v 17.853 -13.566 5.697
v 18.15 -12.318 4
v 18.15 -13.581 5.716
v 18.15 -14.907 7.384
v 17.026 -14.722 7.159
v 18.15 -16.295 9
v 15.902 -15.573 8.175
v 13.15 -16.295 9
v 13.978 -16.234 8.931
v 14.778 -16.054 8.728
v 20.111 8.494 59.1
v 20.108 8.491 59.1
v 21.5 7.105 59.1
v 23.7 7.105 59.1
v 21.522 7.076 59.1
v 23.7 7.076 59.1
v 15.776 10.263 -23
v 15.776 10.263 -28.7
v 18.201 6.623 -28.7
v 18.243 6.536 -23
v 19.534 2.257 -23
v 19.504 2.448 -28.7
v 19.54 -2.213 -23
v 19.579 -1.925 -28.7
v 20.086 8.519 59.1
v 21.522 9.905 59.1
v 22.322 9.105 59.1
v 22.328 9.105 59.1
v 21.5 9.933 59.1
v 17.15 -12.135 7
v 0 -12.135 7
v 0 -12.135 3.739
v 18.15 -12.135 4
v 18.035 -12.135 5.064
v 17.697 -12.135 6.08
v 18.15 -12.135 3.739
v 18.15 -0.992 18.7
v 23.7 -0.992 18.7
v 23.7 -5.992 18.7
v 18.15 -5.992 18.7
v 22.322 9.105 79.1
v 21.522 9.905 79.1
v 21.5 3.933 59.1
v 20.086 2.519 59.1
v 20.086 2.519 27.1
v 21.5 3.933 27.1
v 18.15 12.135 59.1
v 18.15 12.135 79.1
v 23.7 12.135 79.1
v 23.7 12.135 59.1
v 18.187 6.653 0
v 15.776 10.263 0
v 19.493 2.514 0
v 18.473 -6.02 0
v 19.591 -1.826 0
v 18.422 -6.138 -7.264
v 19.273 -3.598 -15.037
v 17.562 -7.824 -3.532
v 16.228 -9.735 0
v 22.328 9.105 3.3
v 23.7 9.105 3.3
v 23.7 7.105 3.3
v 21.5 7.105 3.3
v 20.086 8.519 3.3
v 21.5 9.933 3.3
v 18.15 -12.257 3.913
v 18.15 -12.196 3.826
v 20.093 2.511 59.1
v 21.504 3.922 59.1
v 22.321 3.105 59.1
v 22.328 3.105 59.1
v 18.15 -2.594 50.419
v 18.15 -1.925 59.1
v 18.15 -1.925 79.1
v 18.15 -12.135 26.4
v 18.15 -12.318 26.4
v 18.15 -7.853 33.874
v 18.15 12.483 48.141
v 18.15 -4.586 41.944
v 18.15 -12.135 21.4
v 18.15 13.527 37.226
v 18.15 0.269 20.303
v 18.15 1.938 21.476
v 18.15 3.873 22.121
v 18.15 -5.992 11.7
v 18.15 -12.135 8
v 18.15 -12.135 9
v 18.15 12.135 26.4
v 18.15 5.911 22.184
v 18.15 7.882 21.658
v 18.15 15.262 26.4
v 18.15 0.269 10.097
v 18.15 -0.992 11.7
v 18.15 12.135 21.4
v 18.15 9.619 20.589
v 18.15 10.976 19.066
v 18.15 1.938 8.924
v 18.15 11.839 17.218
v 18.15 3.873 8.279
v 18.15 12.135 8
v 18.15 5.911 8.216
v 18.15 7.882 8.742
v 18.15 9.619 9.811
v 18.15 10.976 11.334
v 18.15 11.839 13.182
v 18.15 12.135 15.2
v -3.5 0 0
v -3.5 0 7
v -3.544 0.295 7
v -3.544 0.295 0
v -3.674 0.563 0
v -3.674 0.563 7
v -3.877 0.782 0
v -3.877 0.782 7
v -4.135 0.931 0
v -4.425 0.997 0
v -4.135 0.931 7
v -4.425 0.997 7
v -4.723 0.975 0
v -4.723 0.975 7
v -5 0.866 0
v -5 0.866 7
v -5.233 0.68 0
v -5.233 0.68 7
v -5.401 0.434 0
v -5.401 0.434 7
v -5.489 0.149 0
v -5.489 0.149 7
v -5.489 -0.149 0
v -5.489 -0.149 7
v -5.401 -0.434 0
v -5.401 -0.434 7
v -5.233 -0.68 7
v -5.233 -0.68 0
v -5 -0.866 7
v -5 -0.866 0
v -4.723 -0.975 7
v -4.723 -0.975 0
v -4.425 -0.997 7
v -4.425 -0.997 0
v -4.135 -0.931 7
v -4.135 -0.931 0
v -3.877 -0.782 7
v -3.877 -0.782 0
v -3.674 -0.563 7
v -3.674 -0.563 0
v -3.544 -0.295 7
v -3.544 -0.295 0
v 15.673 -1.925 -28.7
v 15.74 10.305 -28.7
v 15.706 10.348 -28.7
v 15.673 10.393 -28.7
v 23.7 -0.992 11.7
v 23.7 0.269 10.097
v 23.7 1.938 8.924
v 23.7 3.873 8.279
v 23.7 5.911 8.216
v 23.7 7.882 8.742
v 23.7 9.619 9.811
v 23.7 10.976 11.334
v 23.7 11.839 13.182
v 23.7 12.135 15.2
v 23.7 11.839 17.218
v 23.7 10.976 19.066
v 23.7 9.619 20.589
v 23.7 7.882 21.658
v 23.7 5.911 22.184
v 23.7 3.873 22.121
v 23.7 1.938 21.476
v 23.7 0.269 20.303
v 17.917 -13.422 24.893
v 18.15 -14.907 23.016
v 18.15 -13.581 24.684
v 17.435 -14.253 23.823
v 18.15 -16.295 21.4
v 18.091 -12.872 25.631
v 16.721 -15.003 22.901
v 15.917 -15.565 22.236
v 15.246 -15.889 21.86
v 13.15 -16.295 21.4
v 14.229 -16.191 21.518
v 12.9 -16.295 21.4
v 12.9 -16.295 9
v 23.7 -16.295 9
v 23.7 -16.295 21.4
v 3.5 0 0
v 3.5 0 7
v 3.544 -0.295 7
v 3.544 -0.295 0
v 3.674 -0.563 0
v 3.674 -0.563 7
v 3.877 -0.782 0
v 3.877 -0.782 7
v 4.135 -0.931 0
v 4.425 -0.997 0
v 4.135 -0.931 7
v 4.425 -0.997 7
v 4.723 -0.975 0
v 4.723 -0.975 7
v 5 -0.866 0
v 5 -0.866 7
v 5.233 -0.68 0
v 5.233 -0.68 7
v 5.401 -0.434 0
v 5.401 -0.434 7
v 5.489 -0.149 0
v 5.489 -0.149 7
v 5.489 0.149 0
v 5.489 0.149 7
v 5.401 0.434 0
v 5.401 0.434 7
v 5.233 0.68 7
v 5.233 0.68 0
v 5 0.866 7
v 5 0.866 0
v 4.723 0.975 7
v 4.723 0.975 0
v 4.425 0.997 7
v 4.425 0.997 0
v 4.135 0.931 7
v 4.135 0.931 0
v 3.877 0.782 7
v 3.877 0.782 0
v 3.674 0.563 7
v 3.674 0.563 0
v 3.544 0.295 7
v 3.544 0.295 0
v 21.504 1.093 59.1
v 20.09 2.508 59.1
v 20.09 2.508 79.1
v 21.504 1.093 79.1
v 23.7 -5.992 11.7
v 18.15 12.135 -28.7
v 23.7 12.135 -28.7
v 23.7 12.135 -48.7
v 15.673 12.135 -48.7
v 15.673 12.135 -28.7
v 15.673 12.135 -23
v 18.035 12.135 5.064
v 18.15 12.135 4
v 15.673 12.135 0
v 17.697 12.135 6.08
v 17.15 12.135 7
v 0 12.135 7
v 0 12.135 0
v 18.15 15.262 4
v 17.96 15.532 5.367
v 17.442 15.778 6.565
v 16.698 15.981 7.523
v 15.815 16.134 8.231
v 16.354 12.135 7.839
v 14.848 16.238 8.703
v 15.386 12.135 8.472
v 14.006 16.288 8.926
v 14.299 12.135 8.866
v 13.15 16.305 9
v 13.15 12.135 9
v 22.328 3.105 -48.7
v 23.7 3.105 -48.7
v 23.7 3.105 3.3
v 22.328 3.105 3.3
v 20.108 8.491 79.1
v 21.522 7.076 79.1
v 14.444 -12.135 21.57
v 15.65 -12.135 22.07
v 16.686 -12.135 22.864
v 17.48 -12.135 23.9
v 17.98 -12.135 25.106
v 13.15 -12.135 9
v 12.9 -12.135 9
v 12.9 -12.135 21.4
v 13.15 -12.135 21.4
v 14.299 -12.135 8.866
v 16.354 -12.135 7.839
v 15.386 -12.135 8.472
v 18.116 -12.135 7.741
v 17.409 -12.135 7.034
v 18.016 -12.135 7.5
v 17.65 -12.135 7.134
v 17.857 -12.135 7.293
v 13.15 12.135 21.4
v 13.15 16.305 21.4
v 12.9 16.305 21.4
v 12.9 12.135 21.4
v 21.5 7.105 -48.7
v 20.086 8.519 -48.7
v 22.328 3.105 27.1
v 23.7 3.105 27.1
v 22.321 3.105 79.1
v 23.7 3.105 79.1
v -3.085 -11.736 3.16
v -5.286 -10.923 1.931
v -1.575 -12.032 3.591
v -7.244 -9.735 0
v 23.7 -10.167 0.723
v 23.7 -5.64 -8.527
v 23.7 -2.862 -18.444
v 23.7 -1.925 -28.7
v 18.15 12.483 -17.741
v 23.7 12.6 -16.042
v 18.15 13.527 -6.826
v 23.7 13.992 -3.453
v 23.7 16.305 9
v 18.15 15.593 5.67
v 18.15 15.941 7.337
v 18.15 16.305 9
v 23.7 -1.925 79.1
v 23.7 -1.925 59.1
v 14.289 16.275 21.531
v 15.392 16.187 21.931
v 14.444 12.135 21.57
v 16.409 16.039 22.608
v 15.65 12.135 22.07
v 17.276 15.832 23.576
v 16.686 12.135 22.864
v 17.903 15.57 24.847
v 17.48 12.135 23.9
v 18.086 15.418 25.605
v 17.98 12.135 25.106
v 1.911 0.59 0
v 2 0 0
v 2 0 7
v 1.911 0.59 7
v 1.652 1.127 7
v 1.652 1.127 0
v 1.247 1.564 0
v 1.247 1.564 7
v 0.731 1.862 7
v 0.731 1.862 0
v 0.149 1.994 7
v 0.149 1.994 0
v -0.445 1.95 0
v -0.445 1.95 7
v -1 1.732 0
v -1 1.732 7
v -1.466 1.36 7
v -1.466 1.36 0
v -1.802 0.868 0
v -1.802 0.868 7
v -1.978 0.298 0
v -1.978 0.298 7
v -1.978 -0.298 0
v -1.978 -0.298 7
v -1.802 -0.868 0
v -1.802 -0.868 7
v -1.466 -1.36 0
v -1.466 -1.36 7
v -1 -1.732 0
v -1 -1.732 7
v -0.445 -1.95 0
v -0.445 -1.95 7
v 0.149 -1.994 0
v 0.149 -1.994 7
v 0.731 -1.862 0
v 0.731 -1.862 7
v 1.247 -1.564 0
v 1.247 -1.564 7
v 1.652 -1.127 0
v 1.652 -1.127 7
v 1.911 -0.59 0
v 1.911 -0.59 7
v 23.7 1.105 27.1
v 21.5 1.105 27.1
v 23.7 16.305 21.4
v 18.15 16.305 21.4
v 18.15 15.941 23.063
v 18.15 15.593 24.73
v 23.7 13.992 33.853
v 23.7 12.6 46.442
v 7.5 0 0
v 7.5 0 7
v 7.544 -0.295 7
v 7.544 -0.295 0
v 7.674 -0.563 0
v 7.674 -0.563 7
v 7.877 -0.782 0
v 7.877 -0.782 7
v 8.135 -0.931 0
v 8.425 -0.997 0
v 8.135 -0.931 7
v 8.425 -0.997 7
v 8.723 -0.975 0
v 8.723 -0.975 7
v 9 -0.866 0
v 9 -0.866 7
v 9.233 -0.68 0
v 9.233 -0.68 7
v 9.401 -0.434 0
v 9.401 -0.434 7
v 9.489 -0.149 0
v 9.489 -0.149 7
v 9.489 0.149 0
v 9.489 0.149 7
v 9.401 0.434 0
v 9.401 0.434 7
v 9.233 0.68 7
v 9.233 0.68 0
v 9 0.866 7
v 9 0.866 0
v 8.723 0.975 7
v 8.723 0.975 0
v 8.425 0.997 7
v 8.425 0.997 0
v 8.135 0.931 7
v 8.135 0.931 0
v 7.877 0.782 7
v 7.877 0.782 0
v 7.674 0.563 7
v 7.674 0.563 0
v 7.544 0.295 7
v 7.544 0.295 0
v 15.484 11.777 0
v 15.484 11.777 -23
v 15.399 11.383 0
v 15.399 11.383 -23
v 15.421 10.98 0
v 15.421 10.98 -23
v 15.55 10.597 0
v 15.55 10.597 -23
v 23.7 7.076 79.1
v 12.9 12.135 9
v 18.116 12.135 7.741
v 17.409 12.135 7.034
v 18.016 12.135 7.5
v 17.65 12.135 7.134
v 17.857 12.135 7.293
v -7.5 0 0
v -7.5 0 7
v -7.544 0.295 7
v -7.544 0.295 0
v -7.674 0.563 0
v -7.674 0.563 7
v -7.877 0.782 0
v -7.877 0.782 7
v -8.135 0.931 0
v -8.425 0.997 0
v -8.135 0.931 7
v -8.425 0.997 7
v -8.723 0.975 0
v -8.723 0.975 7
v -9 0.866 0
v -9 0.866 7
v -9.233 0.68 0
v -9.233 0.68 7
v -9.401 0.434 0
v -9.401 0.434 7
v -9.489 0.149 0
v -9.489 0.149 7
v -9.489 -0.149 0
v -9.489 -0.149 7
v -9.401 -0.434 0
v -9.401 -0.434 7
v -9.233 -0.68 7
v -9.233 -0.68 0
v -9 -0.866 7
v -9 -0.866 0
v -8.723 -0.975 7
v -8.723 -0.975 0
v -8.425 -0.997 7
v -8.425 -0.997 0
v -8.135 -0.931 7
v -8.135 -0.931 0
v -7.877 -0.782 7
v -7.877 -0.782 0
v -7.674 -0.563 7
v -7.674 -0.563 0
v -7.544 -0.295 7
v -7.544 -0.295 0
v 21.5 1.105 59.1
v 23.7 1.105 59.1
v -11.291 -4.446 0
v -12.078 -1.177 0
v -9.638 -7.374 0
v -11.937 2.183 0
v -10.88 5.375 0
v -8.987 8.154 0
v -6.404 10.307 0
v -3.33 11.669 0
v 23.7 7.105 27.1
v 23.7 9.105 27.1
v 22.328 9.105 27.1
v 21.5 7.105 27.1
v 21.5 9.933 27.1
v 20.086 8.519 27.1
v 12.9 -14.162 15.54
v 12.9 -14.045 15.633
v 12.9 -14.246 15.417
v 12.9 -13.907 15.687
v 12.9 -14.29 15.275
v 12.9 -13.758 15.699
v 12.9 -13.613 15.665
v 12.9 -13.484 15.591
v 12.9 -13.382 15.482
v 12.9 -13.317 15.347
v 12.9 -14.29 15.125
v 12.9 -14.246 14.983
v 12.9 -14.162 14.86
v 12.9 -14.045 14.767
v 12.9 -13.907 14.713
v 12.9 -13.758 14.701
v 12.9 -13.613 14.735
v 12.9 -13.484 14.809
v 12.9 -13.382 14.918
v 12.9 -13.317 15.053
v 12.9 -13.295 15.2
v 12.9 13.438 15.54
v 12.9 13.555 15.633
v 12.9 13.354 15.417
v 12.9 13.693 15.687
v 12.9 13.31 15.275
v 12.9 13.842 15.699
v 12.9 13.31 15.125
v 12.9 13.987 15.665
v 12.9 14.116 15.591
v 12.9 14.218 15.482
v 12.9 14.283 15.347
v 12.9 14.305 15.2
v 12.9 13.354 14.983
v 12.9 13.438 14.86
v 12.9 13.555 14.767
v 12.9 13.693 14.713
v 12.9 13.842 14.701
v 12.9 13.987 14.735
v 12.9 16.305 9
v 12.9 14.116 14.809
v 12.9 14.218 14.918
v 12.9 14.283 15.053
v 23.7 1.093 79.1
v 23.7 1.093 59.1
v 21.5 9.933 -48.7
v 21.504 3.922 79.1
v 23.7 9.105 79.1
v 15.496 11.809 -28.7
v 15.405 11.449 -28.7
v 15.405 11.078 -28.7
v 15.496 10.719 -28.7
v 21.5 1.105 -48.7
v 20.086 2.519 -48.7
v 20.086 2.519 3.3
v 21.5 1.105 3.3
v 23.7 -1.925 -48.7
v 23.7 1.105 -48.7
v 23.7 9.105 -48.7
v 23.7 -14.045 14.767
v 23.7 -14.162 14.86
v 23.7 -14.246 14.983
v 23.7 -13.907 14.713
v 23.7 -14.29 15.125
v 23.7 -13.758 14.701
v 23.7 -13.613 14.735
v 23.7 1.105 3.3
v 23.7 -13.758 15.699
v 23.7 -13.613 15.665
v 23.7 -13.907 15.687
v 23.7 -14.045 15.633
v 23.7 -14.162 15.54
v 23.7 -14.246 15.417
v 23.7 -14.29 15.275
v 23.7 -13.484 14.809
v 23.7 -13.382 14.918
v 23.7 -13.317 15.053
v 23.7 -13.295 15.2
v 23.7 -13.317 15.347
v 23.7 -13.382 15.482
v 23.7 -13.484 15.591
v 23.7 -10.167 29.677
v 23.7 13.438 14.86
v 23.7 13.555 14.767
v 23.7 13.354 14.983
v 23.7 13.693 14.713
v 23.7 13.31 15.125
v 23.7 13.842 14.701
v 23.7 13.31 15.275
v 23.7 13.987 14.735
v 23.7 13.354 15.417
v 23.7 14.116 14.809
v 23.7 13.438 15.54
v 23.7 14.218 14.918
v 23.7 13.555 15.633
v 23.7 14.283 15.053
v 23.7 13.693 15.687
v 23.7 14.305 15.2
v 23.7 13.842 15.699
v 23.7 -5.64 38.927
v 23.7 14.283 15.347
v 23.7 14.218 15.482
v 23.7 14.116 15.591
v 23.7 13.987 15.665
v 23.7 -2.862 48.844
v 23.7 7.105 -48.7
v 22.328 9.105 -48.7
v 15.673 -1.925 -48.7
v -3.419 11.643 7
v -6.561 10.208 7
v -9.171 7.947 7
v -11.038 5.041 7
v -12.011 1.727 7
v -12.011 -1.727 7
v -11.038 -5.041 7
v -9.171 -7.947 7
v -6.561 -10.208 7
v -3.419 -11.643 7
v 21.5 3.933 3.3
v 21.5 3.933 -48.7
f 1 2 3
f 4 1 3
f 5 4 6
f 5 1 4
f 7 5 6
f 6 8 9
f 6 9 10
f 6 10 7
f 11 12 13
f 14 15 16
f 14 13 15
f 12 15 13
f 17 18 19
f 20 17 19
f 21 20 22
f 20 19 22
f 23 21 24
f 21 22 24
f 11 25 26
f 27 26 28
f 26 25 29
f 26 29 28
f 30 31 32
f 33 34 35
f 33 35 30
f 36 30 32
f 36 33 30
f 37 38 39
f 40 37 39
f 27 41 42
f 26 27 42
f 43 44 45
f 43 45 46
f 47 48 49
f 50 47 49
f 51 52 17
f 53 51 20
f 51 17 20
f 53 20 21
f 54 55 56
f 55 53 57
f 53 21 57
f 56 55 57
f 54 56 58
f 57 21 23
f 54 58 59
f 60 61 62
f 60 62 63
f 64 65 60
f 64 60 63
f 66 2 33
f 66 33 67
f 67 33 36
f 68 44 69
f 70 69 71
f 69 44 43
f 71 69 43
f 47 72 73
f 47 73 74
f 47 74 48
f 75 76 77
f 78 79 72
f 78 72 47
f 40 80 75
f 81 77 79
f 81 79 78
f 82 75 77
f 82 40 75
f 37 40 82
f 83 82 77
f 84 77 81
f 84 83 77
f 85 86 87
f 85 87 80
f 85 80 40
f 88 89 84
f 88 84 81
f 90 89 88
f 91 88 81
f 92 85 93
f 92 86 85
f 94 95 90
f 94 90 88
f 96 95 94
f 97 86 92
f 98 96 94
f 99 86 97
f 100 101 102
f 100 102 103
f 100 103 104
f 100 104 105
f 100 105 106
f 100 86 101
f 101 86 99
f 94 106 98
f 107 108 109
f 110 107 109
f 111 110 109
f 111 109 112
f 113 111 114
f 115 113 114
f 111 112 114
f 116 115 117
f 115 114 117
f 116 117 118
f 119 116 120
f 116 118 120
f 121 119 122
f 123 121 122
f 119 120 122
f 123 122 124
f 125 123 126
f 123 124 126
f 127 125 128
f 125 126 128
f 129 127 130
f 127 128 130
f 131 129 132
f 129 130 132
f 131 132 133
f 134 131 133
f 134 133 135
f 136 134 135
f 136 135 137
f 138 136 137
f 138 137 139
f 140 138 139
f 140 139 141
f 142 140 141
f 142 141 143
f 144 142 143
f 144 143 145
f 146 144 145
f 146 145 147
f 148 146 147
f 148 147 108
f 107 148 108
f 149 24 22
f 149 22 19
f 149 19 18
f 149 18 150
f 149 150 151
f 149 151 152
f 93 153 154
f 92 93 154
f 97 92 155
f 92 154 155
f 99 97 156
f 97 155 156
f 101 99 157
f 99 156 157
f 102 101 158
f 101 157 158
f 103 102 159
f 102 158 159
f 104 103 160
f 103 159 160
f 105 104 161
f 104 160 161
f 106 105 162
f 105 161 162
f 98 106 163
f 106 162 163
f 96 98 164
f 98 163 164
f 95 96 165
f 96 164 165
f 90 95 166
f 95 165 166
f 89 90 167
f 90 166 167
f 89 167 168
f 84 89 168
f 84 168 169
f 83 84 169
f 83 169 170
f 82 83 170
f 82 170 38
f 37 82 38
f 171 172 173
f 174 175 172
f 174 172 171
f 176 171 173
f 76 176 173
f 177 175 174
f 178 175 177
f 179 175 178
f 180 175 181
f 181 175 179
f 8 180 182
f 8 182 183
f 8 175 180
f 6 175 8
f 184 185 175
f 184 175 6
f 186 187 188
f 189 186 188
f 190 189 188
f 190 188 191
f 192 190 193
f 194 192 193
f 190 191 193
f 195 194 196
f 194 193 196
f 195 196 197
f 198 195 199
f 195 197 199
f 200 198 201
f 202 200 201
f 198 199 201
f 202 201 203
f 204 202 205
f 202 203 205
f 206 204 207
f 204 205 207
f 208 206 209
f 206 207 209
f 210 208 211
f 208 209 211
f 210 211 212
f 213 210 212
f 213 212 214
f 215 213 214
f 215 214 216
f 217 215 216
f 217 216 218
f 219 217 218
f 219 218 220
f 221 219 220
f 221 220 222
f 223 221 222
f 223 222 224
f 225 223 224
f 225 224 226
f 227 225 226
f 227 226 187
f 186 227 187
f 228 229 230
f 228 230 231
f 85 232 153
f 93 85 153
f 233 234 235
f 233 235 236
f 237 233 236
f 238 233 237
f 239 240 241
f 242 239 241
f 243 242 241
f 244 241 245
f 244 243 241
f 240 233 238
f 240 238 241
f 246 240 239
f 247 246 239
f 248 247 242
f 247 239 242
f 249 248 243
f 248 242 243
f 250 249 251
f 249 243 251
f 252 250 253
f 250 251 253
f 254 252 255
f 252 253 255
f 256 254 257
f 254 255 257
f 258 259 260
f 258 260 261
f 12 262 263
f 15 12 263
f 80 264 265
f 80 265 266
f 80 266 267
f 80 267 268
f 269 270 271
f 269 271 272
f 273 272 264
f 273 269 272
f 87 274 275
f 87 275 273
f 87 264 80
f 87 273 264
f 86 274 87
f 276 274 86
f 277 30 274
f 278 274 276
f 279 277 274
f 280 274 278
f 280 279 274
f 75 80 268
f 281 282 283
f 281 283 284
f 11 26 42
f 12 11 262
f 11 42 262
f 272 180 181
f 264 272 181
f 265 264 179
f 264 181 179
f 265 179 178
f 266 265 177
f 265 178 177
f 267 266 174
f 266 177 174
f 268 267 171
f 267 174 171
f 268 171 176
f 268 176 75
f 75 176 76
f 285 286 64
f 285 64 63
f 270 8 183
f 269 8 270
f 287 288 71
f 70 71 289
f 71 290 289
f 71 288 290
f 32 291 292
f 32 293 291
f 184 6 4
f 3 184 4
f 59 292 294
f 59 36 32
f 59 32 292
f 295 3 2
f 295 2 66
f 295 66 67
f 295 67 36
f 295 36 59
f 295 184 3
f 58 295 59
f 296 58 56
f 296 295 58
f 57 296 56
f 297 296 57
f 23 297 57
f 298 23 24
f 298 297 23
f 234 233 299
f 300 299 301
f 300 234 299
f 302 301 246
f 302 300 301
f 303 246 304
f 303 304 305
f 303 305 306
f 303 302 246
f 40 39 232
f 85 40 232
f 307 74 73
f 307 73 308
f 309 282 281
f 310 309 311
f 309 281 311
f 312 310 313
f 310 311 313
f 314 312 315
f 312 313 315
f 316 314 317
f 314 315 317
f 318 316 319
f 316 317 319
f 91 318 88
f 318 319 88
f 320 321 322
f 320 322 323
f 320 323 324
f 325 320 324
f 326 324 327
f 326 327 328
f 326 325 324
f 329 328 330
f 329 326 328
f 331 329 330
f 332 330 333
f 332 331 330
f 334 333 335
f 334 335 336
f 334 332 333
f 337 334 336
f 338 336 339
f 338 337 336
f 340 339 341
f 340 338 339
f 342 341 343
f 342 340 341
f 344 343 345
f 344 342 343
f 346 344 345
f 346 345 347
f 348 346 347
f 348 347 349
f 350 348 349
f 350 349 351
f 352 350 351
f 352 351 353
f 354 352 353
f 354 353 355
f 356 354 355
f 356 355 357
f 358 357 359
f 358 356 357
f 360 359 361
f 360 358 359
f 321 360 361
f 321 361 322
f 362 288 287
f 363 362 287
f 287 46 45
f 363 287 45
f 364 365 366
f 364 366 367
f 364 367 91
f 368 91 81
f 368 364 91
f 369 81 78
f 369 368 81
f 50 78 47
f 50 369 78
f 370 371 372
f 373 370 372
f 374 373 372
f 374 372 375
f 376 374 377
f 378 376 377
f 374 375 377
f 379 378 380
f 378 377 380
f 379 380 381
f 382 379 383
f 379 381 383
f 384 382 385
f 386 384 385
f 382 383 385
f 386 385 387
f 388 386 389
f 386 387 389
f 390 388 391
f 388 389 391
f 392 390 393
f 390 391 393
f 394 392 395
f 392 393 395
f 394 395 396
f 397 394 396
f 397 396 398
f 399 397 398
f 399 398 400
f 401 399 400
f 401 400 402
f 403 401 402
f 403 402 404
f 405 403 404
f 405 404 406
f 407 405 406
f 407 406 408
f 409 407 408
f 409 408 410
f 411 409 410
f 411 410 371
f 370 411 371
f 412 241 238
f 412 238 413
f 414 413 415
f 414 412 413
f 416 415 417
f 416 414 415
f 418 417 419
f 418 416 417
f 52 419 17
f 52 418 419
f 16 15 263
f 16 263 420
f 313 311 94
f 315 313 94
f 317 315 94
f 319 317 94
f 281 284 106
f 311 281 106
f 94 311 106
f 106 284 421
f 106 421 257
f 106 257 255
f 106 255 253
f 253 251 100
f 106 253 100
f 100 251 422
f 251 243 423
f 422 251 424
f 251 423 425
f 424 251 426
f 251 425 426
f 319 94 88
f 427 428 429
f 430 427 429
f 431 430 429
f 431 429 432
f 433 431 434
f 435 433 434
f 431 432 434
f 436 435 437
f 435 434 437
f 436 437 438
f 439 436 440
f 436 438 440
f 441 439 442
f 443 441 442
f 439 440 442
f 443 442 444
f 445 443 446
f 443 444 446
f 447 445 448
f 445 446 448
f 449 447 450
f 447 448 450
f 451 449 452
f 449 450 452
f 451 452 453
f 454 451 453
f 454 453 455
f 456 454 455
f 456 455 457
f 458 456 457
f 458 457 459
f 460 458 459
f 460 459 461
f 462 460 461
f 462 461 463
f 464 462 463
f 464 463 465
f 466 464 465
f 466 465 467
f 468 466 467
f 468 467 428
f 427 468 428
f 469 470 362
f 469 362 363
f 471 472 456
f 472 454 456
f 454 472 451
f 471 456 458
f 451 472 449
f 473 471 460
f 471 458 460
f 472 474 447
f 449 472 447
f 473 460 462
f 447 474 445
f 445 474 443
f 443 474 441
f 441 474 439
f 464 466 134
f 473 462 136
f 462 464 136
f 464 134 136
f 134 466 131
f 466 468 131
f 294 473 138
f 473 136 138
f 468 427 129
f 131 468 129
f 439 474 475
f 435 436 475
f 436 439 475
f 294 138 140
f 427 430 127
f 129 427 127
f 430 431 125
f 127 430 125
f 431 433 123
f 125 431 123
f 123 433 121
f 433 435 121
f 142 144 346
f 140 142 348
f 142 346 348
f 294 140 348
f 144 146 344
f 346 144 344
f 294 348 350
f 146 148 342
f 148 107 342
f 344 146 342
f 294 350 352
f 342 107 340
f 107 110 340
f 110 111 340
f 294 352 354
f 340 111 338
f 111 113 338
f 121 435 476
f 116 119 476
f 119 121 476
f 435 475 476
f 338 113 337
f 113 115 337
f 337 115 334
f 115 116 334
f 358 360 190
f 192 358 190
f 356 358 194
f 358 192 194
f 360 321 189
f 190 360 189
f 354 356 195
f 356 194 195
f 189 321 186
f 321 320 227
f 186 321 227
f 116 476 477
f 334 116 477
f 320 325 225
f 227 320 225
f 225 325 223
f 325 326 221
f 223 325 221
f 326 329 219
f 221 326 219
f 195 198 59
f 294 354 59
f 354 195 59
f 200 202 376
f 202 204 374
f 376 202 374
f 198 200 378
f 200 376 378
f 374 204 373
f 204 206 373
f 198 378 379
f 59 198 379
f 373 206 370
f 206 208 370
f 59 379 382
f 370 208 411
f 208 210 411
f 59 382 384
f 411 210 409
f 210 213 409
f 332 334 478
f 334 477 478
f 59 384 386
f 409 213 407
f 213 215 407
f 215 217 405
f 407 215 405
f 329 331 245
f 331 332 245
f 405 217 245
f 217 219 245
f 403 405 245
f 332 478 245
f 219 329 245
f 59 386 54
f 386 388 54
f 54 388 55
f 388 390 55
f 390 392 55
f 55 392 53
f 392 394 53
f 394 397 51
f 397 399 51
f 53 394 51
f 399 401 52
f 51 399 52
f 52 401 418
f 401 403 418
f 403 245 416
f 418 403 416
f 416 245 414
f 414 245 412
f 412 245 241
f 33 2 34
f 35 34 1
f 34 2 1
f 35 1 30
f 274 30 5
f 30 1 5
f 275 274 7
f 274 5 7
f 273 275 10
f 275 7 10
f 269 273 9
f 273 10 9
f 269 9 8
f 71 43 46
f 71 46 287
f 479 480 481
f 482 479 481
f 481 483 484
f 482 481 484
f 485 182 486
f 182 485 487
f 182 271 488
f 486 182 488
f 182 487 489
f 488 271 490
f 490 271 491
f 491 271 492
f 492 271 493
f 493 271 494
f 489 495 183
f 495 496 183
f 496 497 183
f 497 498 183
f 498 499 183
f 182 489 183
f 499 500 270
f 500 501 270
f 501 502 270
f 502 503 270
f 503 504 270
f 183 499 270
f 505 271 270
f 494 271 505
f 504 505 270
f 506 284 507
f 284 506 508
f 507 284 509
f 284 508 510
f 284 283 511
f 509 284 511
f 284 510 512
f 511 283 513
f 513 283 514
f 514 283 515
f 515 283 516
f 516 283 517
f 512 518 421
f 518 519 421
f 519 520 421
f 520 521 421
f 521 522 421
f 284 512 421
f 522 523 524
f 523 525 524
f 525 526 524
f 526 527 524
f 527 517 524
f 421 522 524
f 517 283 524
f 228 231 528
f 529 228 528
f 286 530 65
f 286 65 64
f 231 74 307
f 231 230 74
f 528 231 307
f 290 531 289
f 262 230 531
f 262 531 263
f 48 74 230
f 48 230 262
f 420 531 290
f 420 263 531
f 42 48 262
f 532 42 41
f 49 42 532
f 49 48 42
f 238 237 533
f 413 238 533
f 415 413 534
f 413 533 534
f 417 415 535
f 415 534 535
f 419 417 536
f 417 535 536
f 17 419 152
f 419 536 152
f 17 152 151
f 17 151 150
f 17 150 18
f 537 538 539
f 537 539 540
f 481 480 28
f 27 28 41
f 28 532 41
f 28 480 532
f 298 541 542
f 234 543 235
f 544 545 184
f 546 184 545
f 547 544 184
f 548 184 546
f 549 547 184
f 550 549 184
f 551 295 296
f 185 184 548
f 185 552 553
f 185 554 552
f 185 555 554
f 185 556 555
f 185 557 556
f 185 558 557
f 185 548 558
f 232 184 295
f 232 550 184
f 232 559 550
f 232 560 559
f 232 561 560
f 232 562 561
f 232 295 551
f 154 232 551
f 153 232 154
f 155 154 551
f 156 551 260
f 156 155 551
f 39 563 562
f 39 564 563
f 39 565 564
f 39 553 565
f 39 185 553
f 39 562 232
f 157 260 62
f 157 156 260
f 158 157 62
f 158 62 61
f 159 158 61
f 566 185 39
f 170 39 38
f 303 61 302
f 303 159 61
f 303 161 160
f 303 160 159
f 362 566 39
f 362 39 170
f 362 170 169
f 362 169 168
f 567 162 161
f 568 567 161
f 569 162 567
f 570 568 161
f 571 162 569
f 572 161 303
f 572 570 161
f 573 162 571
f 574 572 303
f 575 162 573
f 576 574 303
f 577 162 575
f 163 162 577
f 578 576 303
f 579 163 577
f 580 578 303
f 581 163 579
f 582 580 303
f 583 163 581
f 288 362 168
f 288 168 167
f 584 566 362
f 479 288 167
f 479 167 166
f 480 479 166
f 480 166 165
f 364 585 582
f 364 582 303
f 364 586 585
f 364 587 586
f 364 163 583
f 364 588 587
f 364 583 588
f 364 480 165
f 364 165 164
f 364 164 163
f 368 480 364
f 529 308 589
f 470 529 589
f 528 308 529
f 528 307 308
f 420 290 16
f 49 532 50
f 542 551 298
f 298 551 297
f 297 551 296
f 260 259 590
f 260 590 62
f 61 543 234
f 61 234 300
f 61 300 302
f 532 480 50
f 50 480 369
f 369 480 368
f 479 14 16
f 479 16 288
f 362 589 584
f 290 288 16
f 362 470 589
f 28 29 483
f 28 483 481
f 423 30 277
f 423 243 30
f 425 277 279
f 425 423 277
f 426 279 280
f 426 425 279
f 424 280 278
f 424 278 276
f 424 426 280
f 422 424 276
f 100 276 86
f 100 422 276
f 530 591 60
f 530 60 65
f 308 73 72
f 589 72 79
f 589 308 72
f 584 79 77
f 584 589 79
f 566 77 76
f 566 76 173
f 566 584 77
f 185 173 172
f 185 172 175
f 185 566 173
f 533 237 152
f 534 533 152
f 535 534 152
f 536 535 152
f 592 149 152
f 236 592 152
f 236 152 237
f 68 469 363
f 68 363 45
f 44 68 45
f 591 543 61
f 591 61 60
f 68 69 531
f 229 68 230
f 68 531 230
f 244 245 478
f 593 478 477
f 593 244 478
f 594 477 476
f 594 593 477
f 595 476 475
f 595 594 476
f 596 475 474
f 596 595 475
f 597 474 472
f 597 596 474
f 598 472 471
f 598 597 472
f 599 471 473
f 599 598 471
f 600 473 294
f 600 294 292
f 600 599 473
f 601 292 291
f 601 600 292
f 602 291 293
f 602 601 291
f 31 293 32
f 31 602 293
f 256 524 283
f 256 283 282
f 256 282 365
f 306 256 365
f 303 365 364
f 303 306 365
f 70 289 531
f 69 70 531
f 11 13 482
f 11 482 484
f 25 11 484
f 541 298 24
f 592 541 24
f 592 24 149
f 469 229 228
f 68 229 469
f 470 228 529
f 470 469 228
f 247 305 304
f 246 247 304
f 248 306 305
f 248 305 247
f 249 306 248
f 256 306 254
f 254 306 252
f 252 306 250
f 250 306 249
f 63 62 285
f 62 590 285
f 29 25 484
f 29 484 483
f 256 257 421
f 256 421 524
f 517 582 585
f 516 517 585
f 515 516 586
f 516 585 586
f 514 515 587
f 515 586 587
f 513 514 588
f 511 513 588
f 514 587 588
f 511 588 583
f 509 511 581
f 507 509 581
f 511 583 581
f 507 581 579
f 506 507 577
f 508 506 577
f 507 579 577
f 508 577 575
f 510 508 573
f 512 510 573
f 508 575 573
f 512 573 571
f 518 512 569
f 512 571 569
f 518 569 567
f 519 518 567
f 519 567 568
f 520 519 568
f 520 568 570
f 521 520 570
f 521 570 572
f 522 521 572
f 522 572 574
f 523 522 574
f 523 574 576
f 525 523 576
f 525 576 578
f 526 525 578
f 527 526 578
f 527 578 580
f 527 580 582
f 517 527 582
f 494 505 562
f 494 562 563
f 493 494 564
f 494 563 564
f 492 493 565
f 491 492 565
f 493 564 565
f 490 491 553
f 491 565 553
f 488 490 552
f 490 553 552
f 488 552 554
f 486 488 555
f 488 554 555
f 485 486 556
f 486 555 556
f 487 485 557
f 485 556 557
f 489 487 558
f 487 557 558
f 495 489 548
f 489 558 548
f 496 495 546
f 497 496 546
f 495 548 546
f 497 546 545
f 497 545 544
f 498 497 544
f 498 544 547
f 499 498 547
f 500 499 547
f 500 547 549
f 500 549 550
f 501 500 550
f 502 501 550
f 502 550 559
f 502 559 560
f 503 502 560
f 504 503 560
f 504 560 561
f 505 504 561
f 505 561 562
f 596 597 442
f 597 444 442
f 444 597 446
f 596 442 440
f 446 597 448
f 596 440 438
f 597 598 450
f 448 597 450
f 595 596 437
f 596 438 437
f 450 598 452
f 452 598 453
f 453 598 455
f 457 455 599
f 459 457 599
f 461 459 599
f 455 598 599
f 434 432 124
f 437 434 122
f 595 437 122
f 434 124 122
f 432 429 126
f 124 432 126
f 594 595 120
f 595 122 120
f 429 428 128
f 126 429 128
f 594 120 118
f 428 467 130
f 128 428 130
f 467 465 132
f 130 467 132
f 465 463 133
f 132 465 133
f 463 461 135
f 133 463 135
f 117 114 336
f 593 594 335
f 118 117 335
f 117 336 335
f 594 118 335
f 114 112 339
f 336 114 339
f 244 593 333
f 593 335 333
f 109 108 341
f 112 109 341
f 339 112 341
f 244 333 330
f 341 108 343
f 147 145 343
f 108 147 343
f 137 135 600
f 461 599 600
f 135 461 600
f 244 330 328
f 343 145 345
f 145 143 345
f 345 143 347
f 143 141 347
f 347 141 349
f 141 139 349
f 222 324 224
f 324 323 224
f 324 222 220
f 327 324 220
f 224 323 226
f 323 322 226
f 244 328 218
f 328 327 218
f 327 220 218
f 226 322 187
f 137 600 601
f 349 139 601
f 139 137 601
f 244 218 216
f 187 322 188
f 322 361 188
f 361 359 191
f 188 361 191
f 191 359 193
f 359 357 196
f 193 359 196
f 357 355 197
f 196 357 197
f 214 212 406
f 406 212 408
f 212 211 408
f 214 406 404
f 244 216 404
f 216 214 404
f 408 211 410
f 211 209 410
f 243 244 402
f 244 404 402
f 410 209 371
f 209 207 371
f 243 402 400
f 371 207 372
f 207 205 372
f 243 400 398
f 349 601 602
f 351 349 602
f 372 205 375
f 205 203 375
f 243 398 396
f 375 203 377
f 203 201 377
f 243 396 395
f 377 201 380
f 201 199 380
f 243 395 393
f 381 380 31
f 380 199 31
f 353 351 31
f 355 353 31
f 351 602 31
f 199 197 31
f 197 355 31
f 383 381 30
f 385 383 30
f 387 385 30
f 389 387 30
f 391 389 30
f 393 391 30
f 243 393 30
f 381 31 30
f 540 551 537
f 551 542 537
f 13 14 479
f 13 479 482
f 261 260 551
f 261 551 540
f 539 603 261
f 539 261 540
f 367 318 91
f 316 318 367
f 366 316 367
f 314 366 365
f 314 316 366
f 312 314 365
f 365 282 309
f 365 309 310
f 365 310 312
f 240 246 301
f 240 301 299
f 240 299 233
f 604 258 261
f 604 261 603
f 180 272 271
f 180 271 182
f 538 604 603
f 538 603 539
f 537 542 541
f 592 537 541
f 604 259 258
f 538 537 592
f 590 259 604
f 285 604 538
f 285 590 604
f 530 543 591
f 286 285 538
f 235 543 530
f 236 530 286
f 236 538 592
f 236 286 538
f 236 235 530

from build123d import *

# Parameters (mm, degrees)
SKETCH1_R               = 2
BOSS_EXTRUDE3_DEPTH     = 7
SKETCH3_R               = 1.0000000000000002
SKETCH3_R_2             = 0.9999999999999998
SKETCH3_R_3             = 0.9999999999999996
SKETCH3_R_4             = 0.9999999999999993
CUT_EXTRUDE2_DEPTH      = 26.09227496303999
BOSS_EXTRUDE4_START     = -7
BOSS_EXTRUDE4_DEPTH     = 7
BOSS_EXTRUDE5_START     = -30
BOSS_EXTRUDE5_DEPTH     = 30
FILLET2_R               = 1.5
CUT_EXTRUDE5_DEPTH      = 42.36510924463761
BOSS_EXTRUDE6_DEPTH     = 10.5
MOVE_START              = -28.7
MOVE_FACE1_DEPTH        = 5.7
DELETEFACE1_START       = 23.7
DELETEFACE1_OUTLINE_W   = 10.499999999999998
DELETEFACE1_OUTLINE_H   = 35.699999999999996
DELETEFACE1_DEPTH       = 15.7
SKETCH11_OUTSIDE_W      = 51.876
SKETCH11_OUTSIDE_H      = 42.462
CUT_EXTRUDE6_DEPTH      = 46.16926949380307
SERVO_START             = -12.760864102
SERVO_MICRO_OUTLINE_W   = 22.6
SERVO_MICRO_OUTLINE_H   = 12.399999999999999
SERVO_MICRO_DEPTH       = 22.3
SERVO_START_2           = 9.539135898
SERVO_MICRO_2_DEPTH     = 4.3
SERVO_START_3           = 2.889135898
SERVO_MICRO_3_DEPTH     = 2.4
SERVO_START_4           = 13.839135898
SERVO_MICRO_4_OUTLINE_R = 2.5
SERVO_MICRO_4_DEPTH     = 3.3
SERVO_START_5           = -25.667487826
SERVO_MICRO_5_OUTLINE_R = 0.6
SERVO_MICRO_5_DEPTH     = 2.3
SERVO_MICRO_6_OUTLINE_R = 0.6
SERVO_MICRO_6_DEPTH     = 2.3
SERVO_MICRO_7_OUTLINE_R = 0.6
SERVO_MICRO_7_DEPTH     = 2.3
BODY_MOVE_COPY1_ANGLE   = 90
SKETCH13_R              = 0.5000000000000009
SKETCH13_W              = 12.399999999999997
SKETCH13_H              = 4.17
SKETCH13_H_2            = 4.160545319150279
BOSS_EXTRUDE7_DEPTH     = 5.55
SKETCH13_3_W            = 12.399999999999997
SKETCH13_3_H            = 4.17
SKETCH13_3_R            = 0.5000000000000009
SKETCH13_3_H_2          = 4.160545319150279
BOSS_EXTRUDE8_DEPTH     = 10.8
CUT_EXTRUDE7_DEPTH      = 32
BOSS_EXTRUDE9_DEPTH     = 5.55
CUT_EXTRUDE8_DEPTH      = 72.0125468998838
BOSS_EXTRUDE10_DEPTH    = 5.55
FILLET8_START           = 12.13472734
FILLET8_DEPTH           = 2.98662
FILLET8_START_2         = -16.295273118
FILLET8_2_DEPTH         = 4.160545778
FILLET8_START_3         = 15.12134734
FILLET8_3_DEPTH         = 1.18338
FILLET8_START_4         = -7.24411042
FILLET8_4_DEPTH         = 25.39411042
FILLET9_R               = 1
SKETCH19_W              = 5.550000000000004
SKETCH19_H              = 14.059999999999988
BOSS_EXTRUDE11_DEPTH    = 20
CUT_EXTRUDE9_DEPTH      = 20
SKETCH21_W              = 8.027459463040207
SKETCH21_H              = 14.059999999999993
BOSS_EXTRUDE12_DEPTH    = 20
CUT_EXTRUDE10_DEPTH     = 20


with BuildPart() as part:
    # Sketch1 → Boss-Extrude3 (new body)
    with BuildSketch(Plane.XY):
        with BuildLine():
            Line((5.606455718863049, 13.824363162033857), (-15.462379801128069, 15.791841653866829))
            Line((-15.462379801128069, 15.791841653866829), (-15.46237980112806, -15.791841653866806))
            Line((-15.46237980112806, -15.791841653866806), (5.606455718863063, -13.824363162033817))
            ThreePointArc((5.606455718863063, -13.824363162033817), (18.200000000000003, 2.613e-14), (5.606455718863049, 13.824363162033857))
        make_face()
        Circle(SKETCH1_R, mode=Mode.SUBTRACT)
    extrude(amount=BOSS_EXTRUDE3_DEPTH)

    # Sketch3 → Cut-Extrude2 (cut, through all)
    with BuildSketch(Plane.XY.offset(7)):
        with Locations((-4.5, 0)):
            Circle(SKETCH3_R)
        with Locations((-8.499999999999998, 0)):
            Circle(SKETCH3_R_2)
        with Locations(Location((4.5, -1.73e-15, 0), (0, 0, 180))):
            Circle(SKETCH3_R_3)
        with Locations(Location((8.499999999999998, -1.73e-15, 0), (0, 0, 180))):
            Circle(SKETCH3_R_4)
    extrude(amount=-CUT_EXTRUDE2_DEPTH, mode=Mode.SUBTRACT)

    # Sketch6 → Boss-Extrude4 (add)
    with BuildSketch(Plane.XY.offset(7).offset(BOSS_EXTRUDE4_START)):
        with BuildLine():
            Line((12.20372638619735, 13.208287910486863), (5.606455718863047, 13.824363162033858))
            ThreePointArc((5.606455718863047, 13.82436316203386), (18.2, 2.598e-14), (5.606455718863056, -13.824363162033816))
            Line((5.606455718863056, -13.824363162033816), (12.203726386197348, -13.208287910486817))
            ThreePointArc((12.203726386197348, -13.208287910486817), (19.699999999999996, 2.132e-14), (12.20372638619735, 13.20828791048686))
        make_face()
    extrude(amount=BOSS_EXTRUDE4_DEPTH)

    # Sketch6<3> → Boss-Extrude5 (add)
    with BuildSketch(Plane.XY.offset(7).offset(BOSS_EXTRUDE5_START)):
        with BuildLine():
            Line((23.700000000000006, 12.13472734042489), (12.20372638619735, 13.208287910486863))
            ThreePointArc((12.20372638619735, 13.20828791048686), (19.699999999999996, 2.132e-14), (12.203726386197348, -13.208287910486817))
            Line((12.203726386197348, -13.208287910486817), (23.700000000000003, -12.134727340424835))
            Line((23.700000000000003, -12.134727340424835), (23.700000000000006, 12.134727340424892))
        make_face()
    extrude(amount=BOSS_EXTRUDE5_DEPTH)

    # Fillet2
    fillet2_edges = [part.edges().sort_by_distance(p)[0] for p in [
        (12.20372638619735, -13.208287910486817, -11.5),
        (12.20372638619735, 13.208287910486861, -11.5),
    ]]
    fillet(fillet2_edges, radius=FILLET2_R)

    # Sketch8 → Cut-Extrude5 (cut, through all)
    with BuildSketch(Plane.XY.offset(7)):
        with BuildLine():
            Line((-15.462379801128069, 15.791841653866829), (-15.46237980112806, -15.791841653866808))
            Line((-15.46237980112806, -15.791841653866806), (1.328273056892355, -14.223874201150027))
            ThreePointArc((1.3282730568923518, -14.22387420115002), (-14.285758873920813, 0), (1.3282730568923529, 14.22387420115002))
            Line((1.3282730568923604, 14.223874201150062), (-15.462379801128069, 15.791841653866829))
        make_face()
    extrude(amount=-CUT_EXTRUDE5_DEPTH, mode=Mode.SUBTRACT)

    # Sketch10 → Boss-Extrude6 (add)
    with BuildSketch(Plane.ZX.offset(1.6347273404248903)):
        Polygon((7, 23.700000000000003), (7, 39.40000000018666), (-28.700000000000003, 39.40000000018665), (-28.700000000000014, 23.700000000000003), align=None)
    extrude(amount=BOSS_EXTRUDE6_DEPTH)

    # Move Face1: read off the stored shape, not the designer's step
    # Move Face1 outline → Move Face1 (add)
    with BuildSketch(Plane.XY.offset(MOVE_START)):
        with BuildLine():
            Line((17.033263706, -12.757289525), (23.7, -12.13472734))
            Line((23.7, -12.13472734), (23.7, 12.13472734))
            Line((23.7, 12.13472734), (17.033263706, 12.757289525))
            ThreePointArc((17.033263706, 12.757289525), (15.554272674, 11.938827155), (15.776353621, 10.263125757))
            ThreePointArc((15.776353621, 10.263125757), (19.7, 0), (15.776353621, -10.263125757))
            ThreePointArc((15.776353621, -10.263125757), (15.554272674, -11.938827155), (17.033263706, -12.757289525))
        make_face()
    extrude(amount=MOVE_FACE1_DEPTH)

    # DeleteFace1: read off the stored shape, not the designer's step
    # DeleteFace1 outline → DeleteFace1 (cut)
    with BuildSketch(Plane.YZ.offset(DELETEFACE1_START)):
        with Locations((6.884727339999999, -10.849999999999998)):
            Rectangle(DELETEFACE1_OUTLINE_W, DELETEFACE1_OUTLINE_H)
    extrude(amount=DELETEFACE1_DEPTH, mode=Mode.SUBTRACT)

    # Sketch11 outside → Cut-Extrude6 (cut, through all)
    with BuildSketch(Plane.XY.offset(7)):
        with Locations((4.706999999999997, 0)):
            Rectangle(SKETCH11_OUTSIDE_W, SKETCH11_OUTSIDE_H)
        with BuildLine():
            Line((23.700000000000003, 12.134727340424888), (-1.43e-15, 12.134727340424885))
            ThreePointArc((-1.43e-15, 12.134727340424885), (-12.134727340424885, 1.49e-15), (0, -12.134727340424885))
            Line((0, -12.134727340424885), (23.700000000000006, -12.134727340424835))
            Line((23.700000000000006, -12.134727340424835), (23.700000000000003, 12.134727340424888))
        make_face(mode=Mode.SUBTRACT)
    extrude(amount=-CUT_EXTRUDE6_DEPTH, mode=Mode.SUBTRACT)

    # Sketch13 → Boss-Extrude7 (add)
    # profile 1 of 3: a face of its own
    with BuildSketch(Plane(origin=(23.700000000000003, -3.39e-15, 0), x_dir=(0, 0, -1), z_dir=(1, -1.4e-16, 0))):
        Polygon((-9.000000000000002, -16.295272659575108), (-9.000000000000002, -12.134727340424831), (-7, -12.134727340424831), (-6.999999999999999, 12.134727340424892), (-9.000000000000002, 12.13472734042489), (-9.000000000000002, 16.30472734042489), (-21.4, 16.30472734042489), (-21.4, 12.13472734042489), (-59.100000000000016, 12.134727340424885), (-59.100000000000016, -12.134727340424831), (-21.4, -12.134727340424831), (-21.4, -16.295272659575108), align=None)
        with Locations(Location((-15.200000000000001, 13.80472734042489, 0), (0, 0, 90))):
            Circle(SKETCH13_R, mode=Mode.SUBTRACT)
        with Locations(Location((-15.200000000000001, -13.79527265957511, 0), (0, 0, 90))):
            Circle(SKETCH13_R, mode=Mode.SUBTRACT)
        with BuildLine():
            ThreePointArc((-11.700000000000001, -0.9920668991734916), (-15.199999999999998, 12.13472734042489), (-18.700000000000003, -0.9920668991734924))
            Line((-18.700000000000003, -0.9920668991734924), (-18.700000000000003, -5.9920668991734924))
            Line((-18.700000000000003, -5.9920668991734924), (-11.700000000000003, -5.992066899173492))
            Line((-11.700000000000003, -5.992066899173492), (-11.700000000000001, -0.9920668991734916))
        make_face(mode=Mode.SUBTRACT)
    # profile 2 of 3: a face of its own
    with BuildSketch(Plane(origin=(23.700000000000003, -3.39e-15, 0), x_dir=(0, 0, -1), z_dir=(1, -1.4e-16, 0))):
        with Locations((-15.2, 14.219727340424889)):
            Rectangle(SKETCH13_W, SKETCH13_H)
        with Locations(Location((-15.200000000000001, 13.80472734042489, 0), (0, 0, 90))):
            Circle(SKETCH13_R, mode=Mode.SUBTRACT)
    # profile 3 of 3: a face of its own
    with BuildSketch(Plane(origin=(23.700000000000003, -3.39e-15, 0), x_dir=(0, 0, -1), z_dir=(1, -1.4e-16, 0))):
        with Locations((-15.2, -14.214999999999968)):
            Rectangle(SKETCH13_W, SKETCH13_H_2)
        with Locations(Location((-15.200000000000001, -13.79527265957511, 0), (0, 0, 90))):
            Circle(SKETCH13_R, mode=Mode.SUBTRACT)
    extrude(amount=-BOSS_EXTRUDE7_DEPTH)

    # Sketch13<3> → Boss-Extrude8 (add)
    # profile 1 of 2: a face of its own
    with BuildSketch(Plane(origin=(23.700000000000003, -3.39e-15, 0), x_dir=(0, 0, -1), z_dir=(1, -1.4e-16, 0))):
        with Locations((-15.2, 14.219727340424889)):
            Rectangle(SKETCH13_3_W, SKETCH13_3_H)
        with Locations(Location((-15.200000000000001, 13.80472734042489, 0), (0, 0, 90))):
            Circle(SKETCH13_3_R, mode=Mode.SUBTRACT)
    # profile 2 of 2: a face of its own
    with BuildSketch(Plane(origin=(23.700000000000003, -3.39e-15, 0), x_dir=(0, 0, -1), z_dir=(1, -1.4e-16, 0))):
        with Locations((-15.2, -14.214999999999968)):
            Rectangle(SKETCH13_3_W, SKETCH13_3_H_2)
        with Locations(Location((-15.200000000000001, -13.79527265957511, 0), (0, 0, 90))):
            Circle(SKETCH13_3_R, mode=Mode.SUBTRACT)
    extrude(amount=-BOSS_EXTRUDE8_DEPTH)

    # Sketch15 → Cut-Extrude7 (cut)
    with BuildSketch(Plane(origin=(1.903e-14, 0, -28.70000000000003), x_dir=(-1, 0, -6.6e-16), z_dir=(6.6e-16, 0, -1))):
        Polygon((-22.328427124746177, 3.104727340424887), (-23.699999999999985, 3.104727340424887), (-23.699999999999985, 1.1047273404248876), (-21.499999999999986, 1.1047273404248876), (-20.08578643762689, 2.5189409027979854), (-21.49999999999999, 3.9331544651710773), align=None)
        Polygon((-22.328427124746177, 9.104727340424887), (-23.699999999999985, 9.104727340424887), (-23.699999999999985, 7.104727340424887), (-21.499999999999986, 7.104727340424887), (-20.08578643762689, 8.518940902797986), (-21.49999999999999, 9.933154465171077), align=None)
    cut_extrude7 = extrude(amount=-CUT_EXTRUDE7_DEPTH, mode=Mode.SUBTRACT)

    # Mirror1: Cut-Extrude7 across plane
    add(cut_extrude7.mirror(Plane(origin=(0, 0, 15.200000000000001), x_dir=(1, 0, 0), z_dir=(0, 0, -1))), mode=Mode.SUBTRACT)

    # Sketch16 → Boss-Extrude9 (add)
    with BuildSketch(Plane(origin=(23.700000000000003, -3.39e-15, 0), x_dir=(0, 0, -1), z_dir=(1, -1.4e-16, 0))):
        with BuildLine():
            Line((-21.4, 12.13472734042489), (-21.4, 16.30472734042489))
            ThreePointArc((-21.4, 16.30472734042489), (-40.135039546574305, 13.18039662240372), (-59.100000000000016, 12.134727340424885))
            Line((-59.100000000000016, 12.134727340424885), (-21.4, 12.13472734042489))
        make_face()
        with BuildLine():
            Line((-9.000000000000002, 16.30472734042489), (-9.000000000000002, 12.13472734042489))
            Line((-9.000000000000002, 12.13472734042489), (28.700000000000014, 12.134727340424892))
            ThreePointArc((28.700000000000014, 12.134727340424892), (9.735039546574328, 13.180396622403777), (-9.000000000000002, 16.30472734042489))
        make_face()
    extrude(amount=-BOSS_EXTRUDE9_DEPTH)

    # Sketch18 → Cut-Extrude8 (cut, through all)
    with BuildSketch(Plane(origin=(23.700000000000003, -3.39e-15, 0), x_dir=(0, 0, -1), z_dir=(1, -1.4e-16, 0))):
        with BuildLine():
            Line((-59.100000000000016, -12.134727340424831), (-26.661429094135563, -12.134727340424831))
            ThreePointArc((-26.661429094135563, -12.134727340424838), (-42.096369157624615, -4.537893974213425), (-59.100000000000016, -1.9252726595751))
            Line((-59.100000000000016, -1.9252726595751037), (-59.100000000000016, -12.134727340424831))
        make_face()
        with BuildLine():
            Line((-3.7385709058644423, -12.134727340424831), (28.700000000000003, -12.134727340424831))
            Line((28.700000000000003, -12.134727340424831), (28.700000000000003, -1.9252726595751037))
            ThreePointArc((28.700000000000003, -1.9252726595751), (11.69636915762461, -4.537893974213425), (-3.738570905864435, -12.134727340424838))
        make_face()
    extrude(amount=-CUT_EXTRUDE8_DEPTH, mode=Mode.SUBTRACT)

    # Sketch18<3> → Boss-Extrude10 (add)
    with BuildSketch(Plane(origin=(23.700000000000003, -3.39e-15, 0), x_dir=(0, 0, -1), z_dir=(1, -1.4e-16, 0))):
        with BuildLine():
            ThreePointArc((-26.661429094135563, -12.134727340424838), (-23.96906894889605, -14.137042924937433), (-21.4, -16.295272659575097))
            Line((-21.4, -16.295272659575108), (-21.4, -12.134727340424831))
            Line((-21.4, -12.134727340424831), (-26.66142909413556, -12.134727340424831))
        make_face()
        with BuildLine():
            ThreePointArc((-9, -16.295272659575097), (-6.430931051103947, -14.137042924937433), (-3.738570905864435, -12.134727340424838))
            Line((-3.7385709058644423, -12.134727340424831), (-9.000000000000005, -12.134727340424831))
            Line((-9.000000000000005, -12.134727340424831), (-9.000000000000005, -16.295272659575108))
        make_face()
    extrude(amount=-BOSS_EXTRUDE10_DEPTH)

    # Fillet8: read off the stored shape, not the designer's step
    # Fillet8 outline → Fillet8 (add)
    with BuildSketch(Plane(origin=(0, 0, 0), x_dir=(1, 0, 0), z_dir=(0, 1, 0)).offset(FILLET8_START)):
        with BuildLine():
            Line((13.15, -9), (18.15, -9))
            Line((18.15, -9), (18.15, -4))
            ThreePointArc((18.15, -4), (16.685533906, -7.535533906), (13.15, -9))
        make_face()
        with BuildLine():
            ThreePointArc((13.15, -21.4), (16.685533906, -22.864466094), (18.15, -26.4))
            Line((18.15, -26.4), (18.15, -21.4))
            Line((18.15, -21.4), (13.15, -21.4))
        make_face()
    extrude(amount=FILLET8_DEPTH)

    # Fillet8 2 outline → Fillet8 2 (add)
    with BuildSketch(Plane(origin=(0, 0, 0), x_dir=(1, 0, 0), z_dir=(0, 1, 0)).offset(FILLET8_START_2)):
        with BuildLine():
            Line((13.15, -9), (18.15, -9))
            Line((18.15, -9), (18.15, -4))
            ThreePointArc((18.15, -4), (16.685533906, -7.535533906), (13.15, -9))
        make_face()
        with BuildLine():
            ThreePointArc((13.15, -21.4), (16.685533906, -22.864466094), (18.15, -26.4))
            Line((18.15, -26.4), (18.15, -21.4))
            Line((18.15, -21.4), (13.15, -21.4))
        make_face()
    extrude(amount=FILLET8_2_DEPTH)

    # Fillet8 3 outline → Fillet8 3 (add)
    with BuildSketch(Plane(origin=(0, 0, 0), x_dir=(1, 0, 0), z_dir=(0, 1, 0)).offset(FILLET8_START_3)):
        with BuildLine():
            Line((13.15, -9), (18.15, -9))
            Line((18.15, -9), (18.15, -4))
            ThreePointArc((18.15, -4), (16.685533906, -7.535533906), (13.15, -9))
        make_face()
        with BuildLine():
            ThreePointArc((13.15, -21.4), (16.685533906, -22.864466094), (18.15, -26.4))
            Line((18.15, -26.4), (18.15, -21.4))
            Line((18.15, -21.4), (13.15, -21.4))
        make_face()
    extrude(amount=FILLET8_3_DEPTH)

    # Fillet8 4 outline → Fillet8 4 (cut)
    with BuildSketch(Plane.YZ.offset(FILLET8_START_4)):
        with BuildLine():
            ThreePointArc((-12.31848008, 4), (-14.236321945, 6.556116062), (-16.29527266, 9))
            Line((-16.29527266, 9), (-16.295273118, 4))
            Line((-16.295273118, 4), (-12.31848008, 4))
        make_face()
        with BuildLine():
            Line((16.30472734, 4), (16.30472734, 9))
            ThreePointArc((16.30472734, 9), (15.765062943, 6.503857829), (15.262410605, 4))
            Line((15.262410605, 4), (16.30472734, 4))
        make_face()
        with BuildLine():
            Line((-12.31848008, 26.4), (-16.295273118, 26.4))
            Line((-16.295273118, 26.4), (-16.29527266, 21.4))
            ThreePointArc((-16.29527266, 21.4), (-14.236321945, 23.843883938), (-12.31848008, 26.4))
        make_face()
        with BuildLine():
            Line((16.30472734, 26.4), (15.262410605, 26.4))
            ThreePointArc((15.262410605, 26.4), (15.765062943, 23.896142171), (16.30472734, 21.4))
            Line((16.30472734, 21.4), (16.30472734, 26.4))
        make_face()
    extrude(amount=FILLET8_4_DEPTH, mode=Mode.SUBTRACT)

    # Fillet9
    fillet9_edges = [part.edges().sort_by_distance(p)[0] for p in [
        (18.150000000000002, 2.76e-14, 7),
    ]]
    fillet(fillet9_edges, radius=FILLET9_R)

    # Sketch19 → Boss-Extrude11 (add)
    with BuildSketch(Plane.XY.offset(59.100000000000016)):
        with Locations((20.925, 5.104727340424887)):
            Rectangle(SKETCH19_W, SKETCH19_H)
    extrude(amount=BOSS_EXTRUDE11_DEPTH)

    # Sketch20 → Cut-Extrude9 (cut)
    with BuildSketch(Plane.XY.offset(79.10000000000002)):
        Polygon((23.722110207744855, 7.076488781049606), (23.722110207744855, 9.104727340424887), (22.32229877311573, 9.104727340424887), (21.522110207744838, 9.904915905795775), (20.107896645371763, 8.490702343422699), (21.522110207744856, 7.076488781049606), align=None)
        Polygon((23.70401004449683, 1.0934240658721006), (23.70401004449683, 3.104727340424886), (22.3211338946902, 3.104727340424886), (21.504010044496816, 3.92185119061827), (20.08979648212374, 2.507637628245194), (21.504010044496834, 1.0934240658721002), align=None)
    extrude(amount=-CUT_EXTRUDE9_DEPTH, mode=Mode.SUBTRACT)

    # Sketch21 → Boss-Extrude12 (add)
    with BuildSketch(Plane(origin=(1.903e-14, 0, -28.70000000000003), x_dir=(-1, 0, -6.6e-16), z_dir=(6.6e-16, 0, -1))):
        with Locations((-19.68627026847988, 5.10472734042489)):
            Rectangle(SKETCH21_W, SKETCH21_H)
    extrude(amount=BOSS_EXTRUDE12_DEPTH)

    # Sketch24 → Cut-Extrude10 (cut)
    with BuildSketch(Plane(origin=(4.21e-14, 0, -48.70000000000004), x_dir=(-1, 0, -8.6e-16), z_dir=(8.6e-16, 0, -1))):
        Polygon((-23.699999999999978, 9.104727340424887), (-22.32842712474612, 9.104727340424887), (-21.499999999999954, 9.933154465171054), (-20.085786437626883, 8.518940902797985), (-21.499999999999982, 7.104727340424887), (-23.699999999999978, 7.104727340424887), align=None)
        Polygon((-23.699999999999978, 3.104727340424887), (-22.32842712474617, 3.104727340424887), (-21.499999999999982, 3.9331544651710755), (-20.085786437626886, 2.518940902797982), (-21.499999999999982, 1.1047273404248876), (-23.699999999999978, 1.1047273404248874), align=None)
    extrude(amount=-CUT_EXTRUDE10_DEPTH, mode=Mode.SUBTRACT)


with BuildPart() as body_2:
    # Servo Micro: read off the stored shape, not the designer's step
    # Servo Micro outline → Servo Micro (new body)
    with BuildSketch(Plane(origin=(0, 0, 0), x_dir=(1, 0, 0), z_dir=(0, 1, 0)).offset(SERVO_START)):
        with Locations((-12.067487826, -26.388081974)):
            Rectangle(SERVO_MICRO_OUTLINE_W, SERVO_MICRO_OUTLINE_H)
    extrude(amount=SERVO_MICRO_DEPTH)

    # Servo Micro 2 outline → Servo Micro 2 (add)
    with BuildSketch(Plane(origin=(0, 0, 0), x_dir=(1, 0, 0), z_dir=(0, 1, 0)).offset(SERVO_START_2)):
        with BuildLine():
            ThreePointArc((-11.10082116, -25.109193568), (-23.367487826, -26.388081974), (-11.10082116, -27.666970381))
            ThreePointArc((-11.10082116, -27.666970381), (-9.567487826, -26.388081975), (-11.10082116, -25.109193568))
        make_face()
    extrude(amount=SERVO_MICRO_2_DEPTH)

    # Servo Micro 3 outline → Servo Micro 3 (add)
    with BuildSketch(Plane(origin=(0, 0, 0), x_dir=(1, 0, 0), z_dir=(0, 1, 0)).offset(SERVO_START_3)):
        with BuildLine():
            Line((2.567676828, -25.838081974), (4.232512174, -25.838081974))
            Line((4.232512174, -25.838081974), (4.232512174, -20.188081974))
            Line((4.232512174, -20.188081974), (-0.767487826, -20.188081974))
            Line((-0.767487826, -20.188081974), (-0.767487826, -32.588081974))
            Line((-0.767487826, -32.588081974), (4.232512174, -32.588081974))
            Line((4.232512174, -32.588081974), (4.232512174, -26.938081974))
            Line((4.232512174, -26.938081974), (2.567676828, -26.938081974))
            ThreePointArc((2.567676828, -26.938081974), (0.732512174, -26.388081974), (2.567676828, -25.838081974))
        make_face()
        with BuildLine():
            Line((-23.367487826, -32.588081974), (-23.367487826, -20.188081974))
            Line((-23.367487826, -20.188081974), (-28.367487826, -20.188081974))
            Line((-28.367487826, -20.188081974), (-28.367487826, -25.838081974))
            Line((-28.367487826, -25.838081974), (-26.702652481, -25.838081974))
            ThreePointArc((-26.702652481, -25.838081974), (-24.867487826, -26.388081974), (-26.702652481, -26.938081974))
            Line((-26.702652481, -26.938081974), (-28.367487826, -26.938081974))
            Line((-28.367487826, -26.938081974), (-28.367487826, -32.588081974))
            Line((-28.367487826, -32.588081974), (-23.367487826, -32.588081974))
        make_face()
    extrude(amount=SERVO_MICRO_3_DEPTH)

    # Servo Micro 4 outline → Servo Micro 4 (add)
    with BuildSketch(Plane(origin=(0, 0, 0), x_dir=(1, 0, 0), z_dir=(0, 1, 0)).offset(SERVO_START_4)):
        with Locations((-17.167487826, -26.388081974)):
            Circle(SERVO_MICRO_4_OUTLINE_R)
    extrude(amount=SERVO_MICRO_4_DEPTH)


with BuildPart() as body_3:
    # Servo Micro 5 outline → Servo Micro 5 (new body)
    with BuildSketch(Plane.YZ.offset(SERVO_START_5)):
        with Locations((-8.260864102, 25.188081974)):
            Circle(SERVO_MICRO_5_OUTLINE_R)
    extrude(amount=SERVO_MICRO_5_DEPTH)


with BuildPart() as body_4:
    # Servo Micro 6 outline → Servo Micro 6 (new body)
    with BuildSketch(Plane.YZ.offset(SERVO_START_5)):
        with Locations((-8.260864102, 27.588081974)):
            Circle(SERVO_MICRO_6_OUTLINE_R)
    extrude(amount=SERVO_MICRO_6_DEPTH)


with BuildPart() as body_5:
    # Servo Micro 7 outline → Servo Micro 7 (new body)
    with BuildSketch(Plane.YZ.offset(SERVO_START_5)):
        with Locations((-8.260864102, 26.388081974)):
            Circle(SERVO_MICRO_7_OUTLINE_R)
    extrude(amount=SERVO_MICRO_7_DEPTH)


with BuildPart() as body_2_1:
    # Body-Move/Copy1: read off the stored shape, not the designer's step
    # Body-Move/Copy1: moved
    add(body_2.part.moved(Location((12.0627605, 7.6108641, -11.188082))).rotate(Axis((0, 0, 0), (0, 0, -1)), BODY_MOVE_COPY1_ANGLE))


solid = part.part
